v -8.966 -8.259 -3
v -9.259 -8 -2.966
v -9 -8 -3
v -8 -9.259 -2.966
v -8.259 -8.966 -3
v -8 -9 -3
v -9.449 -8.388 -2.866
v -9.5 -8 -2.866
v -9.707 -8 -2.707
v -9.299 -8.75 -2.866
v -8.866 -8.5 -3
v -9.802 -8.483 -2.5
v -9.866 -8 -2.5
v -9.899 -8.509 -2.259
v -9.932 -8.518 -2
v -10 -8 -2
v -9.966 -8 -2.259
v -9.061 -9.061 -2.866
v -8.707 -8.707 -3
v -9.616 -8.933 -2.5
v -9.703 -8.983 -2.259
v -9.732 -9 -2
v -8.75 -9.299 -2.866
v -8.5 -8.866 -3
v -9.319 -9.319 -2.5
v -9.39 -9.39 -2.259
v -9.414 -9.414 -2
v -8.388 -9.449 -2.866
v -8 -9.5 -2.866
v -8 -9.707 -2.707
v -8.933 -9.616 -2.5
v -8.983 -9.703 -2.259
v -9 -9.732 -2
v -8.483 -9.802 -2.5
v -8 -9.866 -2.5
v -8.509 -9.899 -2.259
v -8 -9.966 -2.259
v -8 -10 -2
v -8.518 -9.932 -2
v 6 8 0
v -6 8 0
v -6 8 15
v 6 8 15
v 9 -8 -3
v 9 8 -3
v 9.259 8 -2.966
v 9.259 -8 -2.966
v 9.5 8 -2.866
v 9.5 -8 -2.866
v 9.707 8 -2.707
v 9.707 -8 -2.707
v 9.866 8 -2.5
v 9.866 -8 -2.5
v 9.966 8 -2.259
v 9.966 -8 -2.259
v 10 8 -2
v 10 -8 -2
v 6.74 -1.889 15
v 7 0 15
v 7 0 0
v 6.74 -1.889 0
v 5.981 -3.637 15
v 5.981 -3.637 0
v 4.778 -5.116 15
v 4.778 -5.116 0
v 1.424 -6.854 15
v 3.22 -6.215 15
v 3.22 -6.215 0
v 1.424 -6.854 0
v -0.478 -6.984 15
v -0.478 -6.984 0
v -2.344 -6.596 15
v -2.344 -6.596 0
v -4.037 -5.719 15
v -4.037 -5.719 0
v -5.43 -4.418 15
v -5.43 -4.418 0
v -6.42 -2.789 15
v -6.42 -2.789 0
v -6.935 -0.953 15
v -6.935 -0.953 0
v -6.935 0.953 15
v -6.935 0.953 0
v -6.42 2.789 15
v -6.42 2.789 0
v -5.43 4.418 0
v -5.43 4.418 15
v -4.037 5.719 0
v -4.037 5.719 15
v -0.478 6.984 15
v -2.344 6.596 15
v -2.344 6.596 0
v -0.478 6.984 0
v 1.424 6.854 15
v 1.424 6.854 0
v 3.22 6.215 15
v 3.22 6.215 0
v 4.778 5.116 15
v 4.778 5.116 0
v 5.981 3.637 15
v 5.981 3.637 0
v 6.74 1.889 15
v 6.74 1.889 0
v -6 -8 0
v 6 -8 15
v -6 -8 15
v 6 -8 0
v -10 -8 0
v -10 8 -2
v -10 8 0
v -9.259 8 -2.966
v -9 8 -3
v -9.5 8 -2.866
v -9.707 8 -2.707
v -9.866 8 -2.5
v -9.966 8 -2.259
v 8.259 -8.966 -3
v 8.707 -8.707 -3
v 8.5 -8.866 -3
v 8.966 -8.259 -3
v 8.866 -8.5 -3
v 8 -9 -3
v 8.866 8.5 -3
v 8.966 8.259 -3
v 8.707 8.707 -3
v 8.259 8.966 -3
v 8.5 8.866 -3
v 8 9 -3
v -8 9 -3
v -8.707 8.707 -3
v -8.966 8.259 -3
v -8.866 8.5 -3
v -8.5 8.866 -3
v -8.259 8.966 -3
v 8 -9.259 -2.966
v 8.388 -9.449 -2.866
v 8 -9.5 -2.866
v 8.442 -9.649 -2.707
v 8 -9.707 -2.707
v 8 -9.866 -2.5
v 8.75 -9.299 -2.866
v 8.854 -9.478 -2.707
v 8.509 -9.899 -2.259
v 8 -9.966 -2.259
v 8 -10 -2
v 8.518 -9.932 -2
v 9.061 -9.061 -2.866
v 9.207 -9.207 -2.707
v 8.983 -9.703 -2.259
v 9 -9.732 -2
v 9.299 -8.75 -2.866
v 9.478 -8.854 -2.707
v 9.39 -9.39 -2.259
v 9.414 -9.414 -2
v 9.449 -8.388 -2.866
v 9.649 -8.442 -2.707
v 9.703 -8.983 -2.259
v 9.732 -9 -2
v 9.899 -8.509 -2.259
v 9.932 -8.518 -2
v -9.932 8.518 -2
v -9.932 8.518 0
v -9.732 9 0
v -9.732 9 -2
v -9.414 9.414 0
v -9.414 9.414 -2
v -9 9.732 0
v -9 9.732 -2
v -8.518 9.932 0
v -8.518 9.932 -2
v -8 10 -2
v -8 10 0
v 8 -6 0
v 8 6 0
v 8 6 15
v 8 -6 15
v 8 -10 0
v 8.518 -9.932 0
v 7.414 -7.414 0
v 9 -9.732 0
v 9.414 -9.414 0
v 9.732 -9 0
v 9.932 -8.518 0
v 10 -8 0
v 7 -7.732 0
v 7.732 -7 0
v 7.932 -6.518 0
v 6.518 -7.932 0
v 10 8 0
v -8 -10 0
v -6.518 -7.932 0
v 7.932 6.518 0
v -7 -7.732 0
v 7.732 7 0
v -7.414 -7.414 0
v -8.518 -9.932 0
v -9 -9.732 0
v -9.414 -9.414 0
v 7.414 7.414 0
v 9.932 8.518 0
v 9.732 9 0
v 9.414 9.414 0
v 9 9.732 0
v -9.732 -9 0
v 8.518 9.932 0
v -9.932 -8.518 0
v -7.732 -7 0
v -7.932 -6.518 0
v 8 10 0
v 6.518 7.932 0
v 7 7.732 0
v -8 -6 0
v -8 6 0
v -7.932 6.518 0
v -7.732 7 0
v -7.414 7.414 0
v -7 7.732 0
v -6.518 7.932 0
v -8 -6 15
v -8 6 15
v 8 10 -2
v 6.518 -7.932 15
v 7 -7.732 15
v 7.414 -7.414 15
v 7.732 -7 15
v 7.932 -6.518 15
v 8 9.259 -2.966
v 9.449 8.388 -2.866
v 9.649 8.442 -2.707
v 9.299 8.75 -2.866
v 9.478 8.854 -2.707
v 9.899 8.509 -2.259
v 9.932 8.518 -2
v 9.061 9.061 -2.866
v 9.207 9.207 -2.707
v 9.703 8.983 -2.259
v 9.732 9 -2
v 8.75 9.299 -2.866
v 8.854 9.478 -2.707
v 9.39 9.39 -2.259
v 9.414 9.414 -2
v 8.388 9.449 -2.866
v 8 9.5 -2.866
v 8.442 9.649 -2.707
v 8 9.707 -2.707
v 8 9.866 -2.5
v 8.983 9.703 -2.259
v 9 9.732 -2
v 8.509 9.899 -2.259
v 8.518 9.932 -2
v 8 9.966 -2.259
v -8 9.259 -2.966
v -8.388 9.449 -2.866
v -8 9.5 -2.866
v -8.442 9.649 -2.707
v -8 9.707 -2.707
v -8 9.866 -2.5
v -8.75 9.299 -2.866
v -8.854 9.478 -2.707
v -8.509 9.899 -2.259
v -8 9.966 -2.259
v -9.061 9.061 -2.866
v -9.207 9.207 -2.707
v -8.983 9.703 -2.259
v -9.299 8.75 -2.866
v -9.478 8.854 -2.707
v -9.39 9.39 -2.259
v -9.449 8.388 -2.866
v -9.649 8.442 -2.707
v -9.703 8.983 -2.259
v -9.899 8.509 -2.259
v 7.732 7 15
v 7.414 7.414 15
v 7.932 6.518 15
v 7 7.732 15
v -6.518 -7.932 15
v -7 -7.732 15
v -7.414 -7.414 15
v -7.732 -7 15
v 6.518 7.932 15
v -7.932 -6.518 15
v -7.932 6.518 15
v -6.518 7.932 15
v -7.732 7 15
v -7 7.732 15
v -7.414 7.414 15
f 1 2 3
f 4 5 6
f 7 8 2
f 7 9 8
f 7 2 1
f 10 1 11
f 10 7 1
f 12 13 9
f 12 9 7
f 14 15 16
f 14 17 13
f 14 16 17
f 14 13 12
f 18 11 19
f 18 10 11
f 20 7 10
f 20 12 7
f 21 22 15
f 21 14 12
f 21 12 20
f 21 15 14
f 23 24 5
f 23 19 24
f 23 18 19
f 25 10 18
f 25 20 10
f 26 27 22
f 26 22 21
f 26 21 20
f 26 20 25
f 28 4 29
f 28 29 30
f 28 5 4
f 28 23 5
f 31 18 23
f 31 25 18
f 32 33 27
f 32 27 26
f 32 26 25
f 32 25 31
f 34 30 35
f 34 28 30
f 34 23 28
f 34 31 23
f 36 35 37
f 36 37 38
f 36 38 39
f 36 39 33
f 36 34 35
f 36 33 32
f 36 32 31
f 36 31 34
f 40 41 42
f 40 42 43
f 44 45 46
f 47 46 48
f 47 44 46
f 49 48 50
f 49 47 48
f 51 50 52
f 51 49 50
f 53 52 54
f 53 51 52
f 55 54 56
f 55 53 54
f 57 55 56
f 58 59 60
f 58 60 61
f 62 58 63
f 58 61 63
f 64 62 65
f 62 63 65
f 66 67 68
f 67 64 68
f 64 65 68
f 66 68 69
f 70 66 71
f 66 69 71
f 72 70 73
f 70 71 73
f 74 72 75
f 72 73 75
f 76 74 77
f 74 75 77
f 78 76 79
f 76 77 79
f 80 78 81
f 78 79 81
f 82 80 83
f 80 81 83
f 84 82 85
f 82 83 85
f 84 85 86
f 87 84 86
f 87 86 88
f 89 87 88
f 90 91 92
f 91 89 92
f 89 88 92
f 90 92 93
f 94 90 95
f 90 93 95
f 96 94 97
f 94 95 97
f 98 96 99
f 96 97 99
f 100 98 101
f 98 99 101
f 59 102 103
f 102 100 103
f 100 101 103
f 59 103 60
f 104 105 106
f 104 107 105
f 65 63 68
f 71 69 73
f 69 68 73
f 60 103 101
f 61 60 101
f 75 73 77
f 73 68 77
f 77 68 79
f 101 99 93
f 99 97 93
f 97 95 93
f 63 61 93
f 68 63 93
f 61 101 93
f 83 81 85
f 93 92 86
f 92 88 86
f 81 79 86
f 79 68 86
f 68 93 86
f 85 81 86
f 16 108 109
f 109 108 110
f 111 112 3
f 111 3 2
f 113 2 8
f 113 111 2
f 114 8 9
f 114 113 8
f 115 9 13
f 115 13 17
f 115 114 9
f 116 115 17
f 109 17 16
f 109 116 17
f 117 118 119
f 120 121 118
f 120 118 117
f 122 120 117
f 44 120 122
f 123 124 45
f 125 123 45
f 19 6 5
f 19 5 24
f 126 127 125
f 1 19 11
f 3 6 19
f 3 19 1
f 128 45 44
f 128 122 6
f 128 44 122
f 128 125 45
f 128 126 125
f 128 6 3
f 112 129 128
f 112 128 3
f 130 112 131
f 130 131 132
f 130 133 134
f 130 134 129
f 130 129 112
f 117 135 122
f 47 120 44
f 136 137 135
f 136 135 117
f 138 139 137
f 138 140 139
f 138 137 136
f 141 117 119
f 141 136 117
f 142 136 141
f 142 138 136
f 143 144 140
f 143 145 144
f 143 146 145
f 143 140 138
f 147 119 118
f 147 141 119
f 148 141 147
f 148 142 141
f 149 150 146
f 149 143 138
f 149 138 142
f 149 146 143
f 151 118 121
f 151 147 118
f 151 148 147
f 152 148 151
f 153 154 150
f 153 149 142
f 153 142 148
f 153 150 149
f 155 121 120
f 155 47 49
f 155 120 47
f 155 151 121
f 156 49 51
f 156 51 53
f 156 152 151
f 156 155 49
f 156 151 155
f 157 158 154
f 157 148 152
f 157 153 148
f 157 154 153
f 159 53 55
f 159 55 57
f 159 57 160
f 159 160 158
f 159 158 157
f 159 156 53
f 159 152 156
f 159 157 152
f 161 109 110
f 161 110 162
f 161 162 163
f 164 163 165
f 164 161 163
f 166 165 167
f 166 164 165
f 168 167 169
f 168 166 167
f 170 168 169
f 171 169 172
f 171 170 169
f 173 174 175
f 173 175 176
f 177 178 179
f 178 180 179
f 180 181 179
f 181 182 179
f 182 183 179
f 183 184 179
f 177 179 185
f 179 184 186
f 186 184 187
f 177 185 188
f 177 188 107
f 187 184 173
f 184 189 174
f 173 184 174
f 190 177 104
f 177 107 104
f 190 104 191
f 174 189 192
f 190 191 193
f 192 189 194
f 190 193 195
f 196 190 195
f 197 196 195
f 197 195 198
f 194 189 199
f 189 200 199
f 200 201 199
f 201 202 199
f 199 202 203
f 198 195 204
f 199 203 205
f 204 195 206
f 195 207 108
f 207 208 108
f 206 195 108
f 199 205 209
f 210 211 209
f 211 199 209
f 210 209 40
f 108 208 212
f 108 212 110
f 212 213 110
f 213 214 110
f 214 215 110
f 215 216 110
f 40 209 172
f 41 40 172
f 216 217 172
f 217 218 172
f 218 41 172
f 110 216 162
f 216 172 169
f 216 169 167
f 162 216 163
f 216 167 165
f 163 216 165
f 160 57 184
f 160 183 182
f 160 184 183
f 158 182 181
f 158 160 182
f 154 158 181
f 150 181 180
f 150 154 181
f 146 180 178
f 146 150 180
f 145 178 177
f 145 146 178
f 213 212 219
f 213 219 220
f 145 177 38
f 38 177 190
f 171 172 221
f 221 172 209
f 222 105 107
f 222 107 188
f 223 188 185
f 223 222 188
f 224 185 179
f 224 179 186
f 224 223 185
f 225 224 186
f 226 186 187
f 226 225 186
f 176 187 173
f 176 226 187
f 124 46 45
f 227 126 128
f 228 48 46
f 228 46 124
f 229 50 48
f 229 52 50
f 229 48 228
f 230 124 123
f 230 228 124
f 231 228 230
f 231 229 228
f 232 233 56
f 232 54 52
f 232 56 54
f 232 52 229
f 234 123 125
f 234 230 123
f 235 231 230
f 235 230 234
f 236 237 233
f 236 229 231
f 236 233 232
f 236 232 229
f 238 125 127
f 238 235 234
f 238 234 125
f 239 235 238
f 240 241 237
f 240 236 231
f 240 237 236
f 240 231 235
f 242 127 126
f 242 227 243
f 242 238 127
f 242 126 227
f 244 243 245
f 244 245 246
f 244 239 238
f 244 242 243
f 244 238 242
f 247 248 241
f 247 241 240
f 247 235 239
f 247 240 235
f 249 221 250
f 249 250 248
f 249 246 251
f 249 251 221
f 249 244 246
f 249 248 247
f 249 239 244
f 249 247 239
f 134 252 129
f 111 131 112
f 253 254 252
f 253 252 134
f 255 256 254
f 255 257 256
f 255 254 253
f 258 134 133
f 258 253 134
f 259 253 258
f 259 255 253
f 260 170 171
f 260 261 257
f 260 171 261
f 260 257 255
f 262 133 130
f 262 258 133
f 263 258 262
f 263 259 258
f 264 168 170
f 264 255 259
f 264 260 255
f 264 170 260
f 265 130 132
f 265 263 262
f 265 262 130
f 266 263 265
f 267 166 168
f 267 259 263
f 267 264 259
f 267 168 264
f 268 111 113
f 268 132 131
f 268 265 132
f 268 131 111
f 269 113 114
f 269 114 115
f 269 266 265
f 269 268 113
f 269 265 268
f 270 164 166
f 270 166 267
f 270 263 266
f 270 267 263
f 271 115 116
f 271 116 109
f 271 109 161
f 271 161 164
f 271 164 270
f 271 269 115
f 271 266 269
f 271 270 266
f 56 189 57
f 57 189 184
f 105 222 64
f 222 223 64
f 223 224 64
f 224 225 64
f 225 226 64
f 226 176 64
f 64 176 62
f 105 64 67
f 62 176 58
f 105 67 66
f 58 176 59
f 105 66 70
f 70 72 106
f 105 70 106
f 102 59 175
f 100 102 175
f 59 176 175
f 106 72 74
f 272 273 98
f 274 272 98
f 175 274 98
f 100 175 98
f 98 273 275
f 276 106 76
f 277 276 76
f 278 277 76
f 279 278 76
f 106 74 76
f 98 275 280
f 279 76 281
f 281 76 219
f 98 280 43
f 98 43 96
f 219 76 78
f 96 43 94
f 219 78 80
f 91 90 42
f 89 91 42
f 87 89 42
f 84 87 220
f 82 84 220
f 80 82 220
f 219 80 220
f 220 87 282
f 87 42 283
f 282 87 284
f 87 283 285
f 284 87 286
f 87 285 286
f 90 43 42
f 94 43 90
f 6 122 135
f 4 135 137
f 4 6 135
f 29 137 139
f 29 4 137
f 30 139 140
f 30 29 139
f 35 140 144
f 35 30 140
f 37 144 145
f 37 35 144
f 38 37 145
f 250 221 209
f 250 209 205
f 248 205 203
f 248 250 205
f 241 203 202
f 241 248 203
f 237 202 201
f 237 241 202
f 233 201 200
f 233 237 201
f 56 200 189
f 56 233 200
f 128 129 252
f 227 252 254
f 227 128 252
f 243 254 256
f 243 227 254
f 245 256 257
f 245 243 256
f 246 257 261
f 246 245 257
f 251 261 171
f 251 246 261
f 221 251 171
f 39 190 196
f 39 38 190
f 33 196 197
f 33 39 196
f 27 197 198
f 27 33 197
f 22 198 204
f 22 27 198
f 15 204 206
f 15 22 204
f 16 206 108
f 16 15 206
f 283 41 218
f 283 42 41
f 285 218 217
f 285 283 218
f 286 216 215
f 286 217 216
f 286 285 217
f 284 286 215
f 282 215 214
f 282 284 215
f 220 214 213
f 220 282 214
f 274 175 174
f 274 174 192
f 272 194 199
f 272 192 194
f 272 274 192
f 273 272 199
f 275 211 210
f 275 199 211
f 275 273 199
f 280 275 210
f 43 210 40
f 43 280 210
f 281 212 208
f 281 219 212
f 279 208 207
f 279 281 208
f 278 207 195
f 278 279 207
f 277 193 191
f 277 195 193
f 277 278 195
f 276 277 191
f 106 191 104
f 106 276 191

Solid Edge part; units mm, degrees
sketch "Sketch1" plane through (0, 0, 0) normal (0, 0, 1) x (1, 0, 0)
  line L0 (10, -10) -> (-10, -10)
  line L1 (-10, -10) -> (-10, 10)
  line L2 (-10, 10) -> (10, 10)
  line L3 (10, 10) -> (10, -10)
extrude "Protrusion1" add sketch "Sketch1" against normal blind 3
sketch "Sketch2" plane through (0, 0, 0) normal (0, 0, 1) x (1, 0, 0)
  line L0 (8, -8) -> (-8, -8)
  line L1 (-8, -8) -> (-8, 8)
  line L2 (-8, 8) -> (8, 8)
  line L3 (8, 8) -> (8, -8)
  circle A0 centre (0, 0) radius 7
  dimension "D1" = 20
  dimension "D2" = 16
  dimension "D3" = 14
extrude "ExtrudedProtrusion_2" add sketch "Sketch2" along normal blind 15
fillet "Round_1" radius 2 8 edges at (10, -10, -1.5) (10, 10, -1.5) (-10, -10, -1.5) (-10, 10, -1.5) (-8, 8, 7.5) (-8, -8, 7.5) (8, -8, 7.5) (8, 8, 7.5)
fillet "Round_2" radius 1 8 edges at (-10, 0, -3) (-9.4142, 9.4142, -3) (0, 10, -3) (9.4142, 9.4142, -3) (10, 0, -3) (9.4142, -9.4142, -3) (0, -10, -3) (-9.4142, -9.4142, -3)
